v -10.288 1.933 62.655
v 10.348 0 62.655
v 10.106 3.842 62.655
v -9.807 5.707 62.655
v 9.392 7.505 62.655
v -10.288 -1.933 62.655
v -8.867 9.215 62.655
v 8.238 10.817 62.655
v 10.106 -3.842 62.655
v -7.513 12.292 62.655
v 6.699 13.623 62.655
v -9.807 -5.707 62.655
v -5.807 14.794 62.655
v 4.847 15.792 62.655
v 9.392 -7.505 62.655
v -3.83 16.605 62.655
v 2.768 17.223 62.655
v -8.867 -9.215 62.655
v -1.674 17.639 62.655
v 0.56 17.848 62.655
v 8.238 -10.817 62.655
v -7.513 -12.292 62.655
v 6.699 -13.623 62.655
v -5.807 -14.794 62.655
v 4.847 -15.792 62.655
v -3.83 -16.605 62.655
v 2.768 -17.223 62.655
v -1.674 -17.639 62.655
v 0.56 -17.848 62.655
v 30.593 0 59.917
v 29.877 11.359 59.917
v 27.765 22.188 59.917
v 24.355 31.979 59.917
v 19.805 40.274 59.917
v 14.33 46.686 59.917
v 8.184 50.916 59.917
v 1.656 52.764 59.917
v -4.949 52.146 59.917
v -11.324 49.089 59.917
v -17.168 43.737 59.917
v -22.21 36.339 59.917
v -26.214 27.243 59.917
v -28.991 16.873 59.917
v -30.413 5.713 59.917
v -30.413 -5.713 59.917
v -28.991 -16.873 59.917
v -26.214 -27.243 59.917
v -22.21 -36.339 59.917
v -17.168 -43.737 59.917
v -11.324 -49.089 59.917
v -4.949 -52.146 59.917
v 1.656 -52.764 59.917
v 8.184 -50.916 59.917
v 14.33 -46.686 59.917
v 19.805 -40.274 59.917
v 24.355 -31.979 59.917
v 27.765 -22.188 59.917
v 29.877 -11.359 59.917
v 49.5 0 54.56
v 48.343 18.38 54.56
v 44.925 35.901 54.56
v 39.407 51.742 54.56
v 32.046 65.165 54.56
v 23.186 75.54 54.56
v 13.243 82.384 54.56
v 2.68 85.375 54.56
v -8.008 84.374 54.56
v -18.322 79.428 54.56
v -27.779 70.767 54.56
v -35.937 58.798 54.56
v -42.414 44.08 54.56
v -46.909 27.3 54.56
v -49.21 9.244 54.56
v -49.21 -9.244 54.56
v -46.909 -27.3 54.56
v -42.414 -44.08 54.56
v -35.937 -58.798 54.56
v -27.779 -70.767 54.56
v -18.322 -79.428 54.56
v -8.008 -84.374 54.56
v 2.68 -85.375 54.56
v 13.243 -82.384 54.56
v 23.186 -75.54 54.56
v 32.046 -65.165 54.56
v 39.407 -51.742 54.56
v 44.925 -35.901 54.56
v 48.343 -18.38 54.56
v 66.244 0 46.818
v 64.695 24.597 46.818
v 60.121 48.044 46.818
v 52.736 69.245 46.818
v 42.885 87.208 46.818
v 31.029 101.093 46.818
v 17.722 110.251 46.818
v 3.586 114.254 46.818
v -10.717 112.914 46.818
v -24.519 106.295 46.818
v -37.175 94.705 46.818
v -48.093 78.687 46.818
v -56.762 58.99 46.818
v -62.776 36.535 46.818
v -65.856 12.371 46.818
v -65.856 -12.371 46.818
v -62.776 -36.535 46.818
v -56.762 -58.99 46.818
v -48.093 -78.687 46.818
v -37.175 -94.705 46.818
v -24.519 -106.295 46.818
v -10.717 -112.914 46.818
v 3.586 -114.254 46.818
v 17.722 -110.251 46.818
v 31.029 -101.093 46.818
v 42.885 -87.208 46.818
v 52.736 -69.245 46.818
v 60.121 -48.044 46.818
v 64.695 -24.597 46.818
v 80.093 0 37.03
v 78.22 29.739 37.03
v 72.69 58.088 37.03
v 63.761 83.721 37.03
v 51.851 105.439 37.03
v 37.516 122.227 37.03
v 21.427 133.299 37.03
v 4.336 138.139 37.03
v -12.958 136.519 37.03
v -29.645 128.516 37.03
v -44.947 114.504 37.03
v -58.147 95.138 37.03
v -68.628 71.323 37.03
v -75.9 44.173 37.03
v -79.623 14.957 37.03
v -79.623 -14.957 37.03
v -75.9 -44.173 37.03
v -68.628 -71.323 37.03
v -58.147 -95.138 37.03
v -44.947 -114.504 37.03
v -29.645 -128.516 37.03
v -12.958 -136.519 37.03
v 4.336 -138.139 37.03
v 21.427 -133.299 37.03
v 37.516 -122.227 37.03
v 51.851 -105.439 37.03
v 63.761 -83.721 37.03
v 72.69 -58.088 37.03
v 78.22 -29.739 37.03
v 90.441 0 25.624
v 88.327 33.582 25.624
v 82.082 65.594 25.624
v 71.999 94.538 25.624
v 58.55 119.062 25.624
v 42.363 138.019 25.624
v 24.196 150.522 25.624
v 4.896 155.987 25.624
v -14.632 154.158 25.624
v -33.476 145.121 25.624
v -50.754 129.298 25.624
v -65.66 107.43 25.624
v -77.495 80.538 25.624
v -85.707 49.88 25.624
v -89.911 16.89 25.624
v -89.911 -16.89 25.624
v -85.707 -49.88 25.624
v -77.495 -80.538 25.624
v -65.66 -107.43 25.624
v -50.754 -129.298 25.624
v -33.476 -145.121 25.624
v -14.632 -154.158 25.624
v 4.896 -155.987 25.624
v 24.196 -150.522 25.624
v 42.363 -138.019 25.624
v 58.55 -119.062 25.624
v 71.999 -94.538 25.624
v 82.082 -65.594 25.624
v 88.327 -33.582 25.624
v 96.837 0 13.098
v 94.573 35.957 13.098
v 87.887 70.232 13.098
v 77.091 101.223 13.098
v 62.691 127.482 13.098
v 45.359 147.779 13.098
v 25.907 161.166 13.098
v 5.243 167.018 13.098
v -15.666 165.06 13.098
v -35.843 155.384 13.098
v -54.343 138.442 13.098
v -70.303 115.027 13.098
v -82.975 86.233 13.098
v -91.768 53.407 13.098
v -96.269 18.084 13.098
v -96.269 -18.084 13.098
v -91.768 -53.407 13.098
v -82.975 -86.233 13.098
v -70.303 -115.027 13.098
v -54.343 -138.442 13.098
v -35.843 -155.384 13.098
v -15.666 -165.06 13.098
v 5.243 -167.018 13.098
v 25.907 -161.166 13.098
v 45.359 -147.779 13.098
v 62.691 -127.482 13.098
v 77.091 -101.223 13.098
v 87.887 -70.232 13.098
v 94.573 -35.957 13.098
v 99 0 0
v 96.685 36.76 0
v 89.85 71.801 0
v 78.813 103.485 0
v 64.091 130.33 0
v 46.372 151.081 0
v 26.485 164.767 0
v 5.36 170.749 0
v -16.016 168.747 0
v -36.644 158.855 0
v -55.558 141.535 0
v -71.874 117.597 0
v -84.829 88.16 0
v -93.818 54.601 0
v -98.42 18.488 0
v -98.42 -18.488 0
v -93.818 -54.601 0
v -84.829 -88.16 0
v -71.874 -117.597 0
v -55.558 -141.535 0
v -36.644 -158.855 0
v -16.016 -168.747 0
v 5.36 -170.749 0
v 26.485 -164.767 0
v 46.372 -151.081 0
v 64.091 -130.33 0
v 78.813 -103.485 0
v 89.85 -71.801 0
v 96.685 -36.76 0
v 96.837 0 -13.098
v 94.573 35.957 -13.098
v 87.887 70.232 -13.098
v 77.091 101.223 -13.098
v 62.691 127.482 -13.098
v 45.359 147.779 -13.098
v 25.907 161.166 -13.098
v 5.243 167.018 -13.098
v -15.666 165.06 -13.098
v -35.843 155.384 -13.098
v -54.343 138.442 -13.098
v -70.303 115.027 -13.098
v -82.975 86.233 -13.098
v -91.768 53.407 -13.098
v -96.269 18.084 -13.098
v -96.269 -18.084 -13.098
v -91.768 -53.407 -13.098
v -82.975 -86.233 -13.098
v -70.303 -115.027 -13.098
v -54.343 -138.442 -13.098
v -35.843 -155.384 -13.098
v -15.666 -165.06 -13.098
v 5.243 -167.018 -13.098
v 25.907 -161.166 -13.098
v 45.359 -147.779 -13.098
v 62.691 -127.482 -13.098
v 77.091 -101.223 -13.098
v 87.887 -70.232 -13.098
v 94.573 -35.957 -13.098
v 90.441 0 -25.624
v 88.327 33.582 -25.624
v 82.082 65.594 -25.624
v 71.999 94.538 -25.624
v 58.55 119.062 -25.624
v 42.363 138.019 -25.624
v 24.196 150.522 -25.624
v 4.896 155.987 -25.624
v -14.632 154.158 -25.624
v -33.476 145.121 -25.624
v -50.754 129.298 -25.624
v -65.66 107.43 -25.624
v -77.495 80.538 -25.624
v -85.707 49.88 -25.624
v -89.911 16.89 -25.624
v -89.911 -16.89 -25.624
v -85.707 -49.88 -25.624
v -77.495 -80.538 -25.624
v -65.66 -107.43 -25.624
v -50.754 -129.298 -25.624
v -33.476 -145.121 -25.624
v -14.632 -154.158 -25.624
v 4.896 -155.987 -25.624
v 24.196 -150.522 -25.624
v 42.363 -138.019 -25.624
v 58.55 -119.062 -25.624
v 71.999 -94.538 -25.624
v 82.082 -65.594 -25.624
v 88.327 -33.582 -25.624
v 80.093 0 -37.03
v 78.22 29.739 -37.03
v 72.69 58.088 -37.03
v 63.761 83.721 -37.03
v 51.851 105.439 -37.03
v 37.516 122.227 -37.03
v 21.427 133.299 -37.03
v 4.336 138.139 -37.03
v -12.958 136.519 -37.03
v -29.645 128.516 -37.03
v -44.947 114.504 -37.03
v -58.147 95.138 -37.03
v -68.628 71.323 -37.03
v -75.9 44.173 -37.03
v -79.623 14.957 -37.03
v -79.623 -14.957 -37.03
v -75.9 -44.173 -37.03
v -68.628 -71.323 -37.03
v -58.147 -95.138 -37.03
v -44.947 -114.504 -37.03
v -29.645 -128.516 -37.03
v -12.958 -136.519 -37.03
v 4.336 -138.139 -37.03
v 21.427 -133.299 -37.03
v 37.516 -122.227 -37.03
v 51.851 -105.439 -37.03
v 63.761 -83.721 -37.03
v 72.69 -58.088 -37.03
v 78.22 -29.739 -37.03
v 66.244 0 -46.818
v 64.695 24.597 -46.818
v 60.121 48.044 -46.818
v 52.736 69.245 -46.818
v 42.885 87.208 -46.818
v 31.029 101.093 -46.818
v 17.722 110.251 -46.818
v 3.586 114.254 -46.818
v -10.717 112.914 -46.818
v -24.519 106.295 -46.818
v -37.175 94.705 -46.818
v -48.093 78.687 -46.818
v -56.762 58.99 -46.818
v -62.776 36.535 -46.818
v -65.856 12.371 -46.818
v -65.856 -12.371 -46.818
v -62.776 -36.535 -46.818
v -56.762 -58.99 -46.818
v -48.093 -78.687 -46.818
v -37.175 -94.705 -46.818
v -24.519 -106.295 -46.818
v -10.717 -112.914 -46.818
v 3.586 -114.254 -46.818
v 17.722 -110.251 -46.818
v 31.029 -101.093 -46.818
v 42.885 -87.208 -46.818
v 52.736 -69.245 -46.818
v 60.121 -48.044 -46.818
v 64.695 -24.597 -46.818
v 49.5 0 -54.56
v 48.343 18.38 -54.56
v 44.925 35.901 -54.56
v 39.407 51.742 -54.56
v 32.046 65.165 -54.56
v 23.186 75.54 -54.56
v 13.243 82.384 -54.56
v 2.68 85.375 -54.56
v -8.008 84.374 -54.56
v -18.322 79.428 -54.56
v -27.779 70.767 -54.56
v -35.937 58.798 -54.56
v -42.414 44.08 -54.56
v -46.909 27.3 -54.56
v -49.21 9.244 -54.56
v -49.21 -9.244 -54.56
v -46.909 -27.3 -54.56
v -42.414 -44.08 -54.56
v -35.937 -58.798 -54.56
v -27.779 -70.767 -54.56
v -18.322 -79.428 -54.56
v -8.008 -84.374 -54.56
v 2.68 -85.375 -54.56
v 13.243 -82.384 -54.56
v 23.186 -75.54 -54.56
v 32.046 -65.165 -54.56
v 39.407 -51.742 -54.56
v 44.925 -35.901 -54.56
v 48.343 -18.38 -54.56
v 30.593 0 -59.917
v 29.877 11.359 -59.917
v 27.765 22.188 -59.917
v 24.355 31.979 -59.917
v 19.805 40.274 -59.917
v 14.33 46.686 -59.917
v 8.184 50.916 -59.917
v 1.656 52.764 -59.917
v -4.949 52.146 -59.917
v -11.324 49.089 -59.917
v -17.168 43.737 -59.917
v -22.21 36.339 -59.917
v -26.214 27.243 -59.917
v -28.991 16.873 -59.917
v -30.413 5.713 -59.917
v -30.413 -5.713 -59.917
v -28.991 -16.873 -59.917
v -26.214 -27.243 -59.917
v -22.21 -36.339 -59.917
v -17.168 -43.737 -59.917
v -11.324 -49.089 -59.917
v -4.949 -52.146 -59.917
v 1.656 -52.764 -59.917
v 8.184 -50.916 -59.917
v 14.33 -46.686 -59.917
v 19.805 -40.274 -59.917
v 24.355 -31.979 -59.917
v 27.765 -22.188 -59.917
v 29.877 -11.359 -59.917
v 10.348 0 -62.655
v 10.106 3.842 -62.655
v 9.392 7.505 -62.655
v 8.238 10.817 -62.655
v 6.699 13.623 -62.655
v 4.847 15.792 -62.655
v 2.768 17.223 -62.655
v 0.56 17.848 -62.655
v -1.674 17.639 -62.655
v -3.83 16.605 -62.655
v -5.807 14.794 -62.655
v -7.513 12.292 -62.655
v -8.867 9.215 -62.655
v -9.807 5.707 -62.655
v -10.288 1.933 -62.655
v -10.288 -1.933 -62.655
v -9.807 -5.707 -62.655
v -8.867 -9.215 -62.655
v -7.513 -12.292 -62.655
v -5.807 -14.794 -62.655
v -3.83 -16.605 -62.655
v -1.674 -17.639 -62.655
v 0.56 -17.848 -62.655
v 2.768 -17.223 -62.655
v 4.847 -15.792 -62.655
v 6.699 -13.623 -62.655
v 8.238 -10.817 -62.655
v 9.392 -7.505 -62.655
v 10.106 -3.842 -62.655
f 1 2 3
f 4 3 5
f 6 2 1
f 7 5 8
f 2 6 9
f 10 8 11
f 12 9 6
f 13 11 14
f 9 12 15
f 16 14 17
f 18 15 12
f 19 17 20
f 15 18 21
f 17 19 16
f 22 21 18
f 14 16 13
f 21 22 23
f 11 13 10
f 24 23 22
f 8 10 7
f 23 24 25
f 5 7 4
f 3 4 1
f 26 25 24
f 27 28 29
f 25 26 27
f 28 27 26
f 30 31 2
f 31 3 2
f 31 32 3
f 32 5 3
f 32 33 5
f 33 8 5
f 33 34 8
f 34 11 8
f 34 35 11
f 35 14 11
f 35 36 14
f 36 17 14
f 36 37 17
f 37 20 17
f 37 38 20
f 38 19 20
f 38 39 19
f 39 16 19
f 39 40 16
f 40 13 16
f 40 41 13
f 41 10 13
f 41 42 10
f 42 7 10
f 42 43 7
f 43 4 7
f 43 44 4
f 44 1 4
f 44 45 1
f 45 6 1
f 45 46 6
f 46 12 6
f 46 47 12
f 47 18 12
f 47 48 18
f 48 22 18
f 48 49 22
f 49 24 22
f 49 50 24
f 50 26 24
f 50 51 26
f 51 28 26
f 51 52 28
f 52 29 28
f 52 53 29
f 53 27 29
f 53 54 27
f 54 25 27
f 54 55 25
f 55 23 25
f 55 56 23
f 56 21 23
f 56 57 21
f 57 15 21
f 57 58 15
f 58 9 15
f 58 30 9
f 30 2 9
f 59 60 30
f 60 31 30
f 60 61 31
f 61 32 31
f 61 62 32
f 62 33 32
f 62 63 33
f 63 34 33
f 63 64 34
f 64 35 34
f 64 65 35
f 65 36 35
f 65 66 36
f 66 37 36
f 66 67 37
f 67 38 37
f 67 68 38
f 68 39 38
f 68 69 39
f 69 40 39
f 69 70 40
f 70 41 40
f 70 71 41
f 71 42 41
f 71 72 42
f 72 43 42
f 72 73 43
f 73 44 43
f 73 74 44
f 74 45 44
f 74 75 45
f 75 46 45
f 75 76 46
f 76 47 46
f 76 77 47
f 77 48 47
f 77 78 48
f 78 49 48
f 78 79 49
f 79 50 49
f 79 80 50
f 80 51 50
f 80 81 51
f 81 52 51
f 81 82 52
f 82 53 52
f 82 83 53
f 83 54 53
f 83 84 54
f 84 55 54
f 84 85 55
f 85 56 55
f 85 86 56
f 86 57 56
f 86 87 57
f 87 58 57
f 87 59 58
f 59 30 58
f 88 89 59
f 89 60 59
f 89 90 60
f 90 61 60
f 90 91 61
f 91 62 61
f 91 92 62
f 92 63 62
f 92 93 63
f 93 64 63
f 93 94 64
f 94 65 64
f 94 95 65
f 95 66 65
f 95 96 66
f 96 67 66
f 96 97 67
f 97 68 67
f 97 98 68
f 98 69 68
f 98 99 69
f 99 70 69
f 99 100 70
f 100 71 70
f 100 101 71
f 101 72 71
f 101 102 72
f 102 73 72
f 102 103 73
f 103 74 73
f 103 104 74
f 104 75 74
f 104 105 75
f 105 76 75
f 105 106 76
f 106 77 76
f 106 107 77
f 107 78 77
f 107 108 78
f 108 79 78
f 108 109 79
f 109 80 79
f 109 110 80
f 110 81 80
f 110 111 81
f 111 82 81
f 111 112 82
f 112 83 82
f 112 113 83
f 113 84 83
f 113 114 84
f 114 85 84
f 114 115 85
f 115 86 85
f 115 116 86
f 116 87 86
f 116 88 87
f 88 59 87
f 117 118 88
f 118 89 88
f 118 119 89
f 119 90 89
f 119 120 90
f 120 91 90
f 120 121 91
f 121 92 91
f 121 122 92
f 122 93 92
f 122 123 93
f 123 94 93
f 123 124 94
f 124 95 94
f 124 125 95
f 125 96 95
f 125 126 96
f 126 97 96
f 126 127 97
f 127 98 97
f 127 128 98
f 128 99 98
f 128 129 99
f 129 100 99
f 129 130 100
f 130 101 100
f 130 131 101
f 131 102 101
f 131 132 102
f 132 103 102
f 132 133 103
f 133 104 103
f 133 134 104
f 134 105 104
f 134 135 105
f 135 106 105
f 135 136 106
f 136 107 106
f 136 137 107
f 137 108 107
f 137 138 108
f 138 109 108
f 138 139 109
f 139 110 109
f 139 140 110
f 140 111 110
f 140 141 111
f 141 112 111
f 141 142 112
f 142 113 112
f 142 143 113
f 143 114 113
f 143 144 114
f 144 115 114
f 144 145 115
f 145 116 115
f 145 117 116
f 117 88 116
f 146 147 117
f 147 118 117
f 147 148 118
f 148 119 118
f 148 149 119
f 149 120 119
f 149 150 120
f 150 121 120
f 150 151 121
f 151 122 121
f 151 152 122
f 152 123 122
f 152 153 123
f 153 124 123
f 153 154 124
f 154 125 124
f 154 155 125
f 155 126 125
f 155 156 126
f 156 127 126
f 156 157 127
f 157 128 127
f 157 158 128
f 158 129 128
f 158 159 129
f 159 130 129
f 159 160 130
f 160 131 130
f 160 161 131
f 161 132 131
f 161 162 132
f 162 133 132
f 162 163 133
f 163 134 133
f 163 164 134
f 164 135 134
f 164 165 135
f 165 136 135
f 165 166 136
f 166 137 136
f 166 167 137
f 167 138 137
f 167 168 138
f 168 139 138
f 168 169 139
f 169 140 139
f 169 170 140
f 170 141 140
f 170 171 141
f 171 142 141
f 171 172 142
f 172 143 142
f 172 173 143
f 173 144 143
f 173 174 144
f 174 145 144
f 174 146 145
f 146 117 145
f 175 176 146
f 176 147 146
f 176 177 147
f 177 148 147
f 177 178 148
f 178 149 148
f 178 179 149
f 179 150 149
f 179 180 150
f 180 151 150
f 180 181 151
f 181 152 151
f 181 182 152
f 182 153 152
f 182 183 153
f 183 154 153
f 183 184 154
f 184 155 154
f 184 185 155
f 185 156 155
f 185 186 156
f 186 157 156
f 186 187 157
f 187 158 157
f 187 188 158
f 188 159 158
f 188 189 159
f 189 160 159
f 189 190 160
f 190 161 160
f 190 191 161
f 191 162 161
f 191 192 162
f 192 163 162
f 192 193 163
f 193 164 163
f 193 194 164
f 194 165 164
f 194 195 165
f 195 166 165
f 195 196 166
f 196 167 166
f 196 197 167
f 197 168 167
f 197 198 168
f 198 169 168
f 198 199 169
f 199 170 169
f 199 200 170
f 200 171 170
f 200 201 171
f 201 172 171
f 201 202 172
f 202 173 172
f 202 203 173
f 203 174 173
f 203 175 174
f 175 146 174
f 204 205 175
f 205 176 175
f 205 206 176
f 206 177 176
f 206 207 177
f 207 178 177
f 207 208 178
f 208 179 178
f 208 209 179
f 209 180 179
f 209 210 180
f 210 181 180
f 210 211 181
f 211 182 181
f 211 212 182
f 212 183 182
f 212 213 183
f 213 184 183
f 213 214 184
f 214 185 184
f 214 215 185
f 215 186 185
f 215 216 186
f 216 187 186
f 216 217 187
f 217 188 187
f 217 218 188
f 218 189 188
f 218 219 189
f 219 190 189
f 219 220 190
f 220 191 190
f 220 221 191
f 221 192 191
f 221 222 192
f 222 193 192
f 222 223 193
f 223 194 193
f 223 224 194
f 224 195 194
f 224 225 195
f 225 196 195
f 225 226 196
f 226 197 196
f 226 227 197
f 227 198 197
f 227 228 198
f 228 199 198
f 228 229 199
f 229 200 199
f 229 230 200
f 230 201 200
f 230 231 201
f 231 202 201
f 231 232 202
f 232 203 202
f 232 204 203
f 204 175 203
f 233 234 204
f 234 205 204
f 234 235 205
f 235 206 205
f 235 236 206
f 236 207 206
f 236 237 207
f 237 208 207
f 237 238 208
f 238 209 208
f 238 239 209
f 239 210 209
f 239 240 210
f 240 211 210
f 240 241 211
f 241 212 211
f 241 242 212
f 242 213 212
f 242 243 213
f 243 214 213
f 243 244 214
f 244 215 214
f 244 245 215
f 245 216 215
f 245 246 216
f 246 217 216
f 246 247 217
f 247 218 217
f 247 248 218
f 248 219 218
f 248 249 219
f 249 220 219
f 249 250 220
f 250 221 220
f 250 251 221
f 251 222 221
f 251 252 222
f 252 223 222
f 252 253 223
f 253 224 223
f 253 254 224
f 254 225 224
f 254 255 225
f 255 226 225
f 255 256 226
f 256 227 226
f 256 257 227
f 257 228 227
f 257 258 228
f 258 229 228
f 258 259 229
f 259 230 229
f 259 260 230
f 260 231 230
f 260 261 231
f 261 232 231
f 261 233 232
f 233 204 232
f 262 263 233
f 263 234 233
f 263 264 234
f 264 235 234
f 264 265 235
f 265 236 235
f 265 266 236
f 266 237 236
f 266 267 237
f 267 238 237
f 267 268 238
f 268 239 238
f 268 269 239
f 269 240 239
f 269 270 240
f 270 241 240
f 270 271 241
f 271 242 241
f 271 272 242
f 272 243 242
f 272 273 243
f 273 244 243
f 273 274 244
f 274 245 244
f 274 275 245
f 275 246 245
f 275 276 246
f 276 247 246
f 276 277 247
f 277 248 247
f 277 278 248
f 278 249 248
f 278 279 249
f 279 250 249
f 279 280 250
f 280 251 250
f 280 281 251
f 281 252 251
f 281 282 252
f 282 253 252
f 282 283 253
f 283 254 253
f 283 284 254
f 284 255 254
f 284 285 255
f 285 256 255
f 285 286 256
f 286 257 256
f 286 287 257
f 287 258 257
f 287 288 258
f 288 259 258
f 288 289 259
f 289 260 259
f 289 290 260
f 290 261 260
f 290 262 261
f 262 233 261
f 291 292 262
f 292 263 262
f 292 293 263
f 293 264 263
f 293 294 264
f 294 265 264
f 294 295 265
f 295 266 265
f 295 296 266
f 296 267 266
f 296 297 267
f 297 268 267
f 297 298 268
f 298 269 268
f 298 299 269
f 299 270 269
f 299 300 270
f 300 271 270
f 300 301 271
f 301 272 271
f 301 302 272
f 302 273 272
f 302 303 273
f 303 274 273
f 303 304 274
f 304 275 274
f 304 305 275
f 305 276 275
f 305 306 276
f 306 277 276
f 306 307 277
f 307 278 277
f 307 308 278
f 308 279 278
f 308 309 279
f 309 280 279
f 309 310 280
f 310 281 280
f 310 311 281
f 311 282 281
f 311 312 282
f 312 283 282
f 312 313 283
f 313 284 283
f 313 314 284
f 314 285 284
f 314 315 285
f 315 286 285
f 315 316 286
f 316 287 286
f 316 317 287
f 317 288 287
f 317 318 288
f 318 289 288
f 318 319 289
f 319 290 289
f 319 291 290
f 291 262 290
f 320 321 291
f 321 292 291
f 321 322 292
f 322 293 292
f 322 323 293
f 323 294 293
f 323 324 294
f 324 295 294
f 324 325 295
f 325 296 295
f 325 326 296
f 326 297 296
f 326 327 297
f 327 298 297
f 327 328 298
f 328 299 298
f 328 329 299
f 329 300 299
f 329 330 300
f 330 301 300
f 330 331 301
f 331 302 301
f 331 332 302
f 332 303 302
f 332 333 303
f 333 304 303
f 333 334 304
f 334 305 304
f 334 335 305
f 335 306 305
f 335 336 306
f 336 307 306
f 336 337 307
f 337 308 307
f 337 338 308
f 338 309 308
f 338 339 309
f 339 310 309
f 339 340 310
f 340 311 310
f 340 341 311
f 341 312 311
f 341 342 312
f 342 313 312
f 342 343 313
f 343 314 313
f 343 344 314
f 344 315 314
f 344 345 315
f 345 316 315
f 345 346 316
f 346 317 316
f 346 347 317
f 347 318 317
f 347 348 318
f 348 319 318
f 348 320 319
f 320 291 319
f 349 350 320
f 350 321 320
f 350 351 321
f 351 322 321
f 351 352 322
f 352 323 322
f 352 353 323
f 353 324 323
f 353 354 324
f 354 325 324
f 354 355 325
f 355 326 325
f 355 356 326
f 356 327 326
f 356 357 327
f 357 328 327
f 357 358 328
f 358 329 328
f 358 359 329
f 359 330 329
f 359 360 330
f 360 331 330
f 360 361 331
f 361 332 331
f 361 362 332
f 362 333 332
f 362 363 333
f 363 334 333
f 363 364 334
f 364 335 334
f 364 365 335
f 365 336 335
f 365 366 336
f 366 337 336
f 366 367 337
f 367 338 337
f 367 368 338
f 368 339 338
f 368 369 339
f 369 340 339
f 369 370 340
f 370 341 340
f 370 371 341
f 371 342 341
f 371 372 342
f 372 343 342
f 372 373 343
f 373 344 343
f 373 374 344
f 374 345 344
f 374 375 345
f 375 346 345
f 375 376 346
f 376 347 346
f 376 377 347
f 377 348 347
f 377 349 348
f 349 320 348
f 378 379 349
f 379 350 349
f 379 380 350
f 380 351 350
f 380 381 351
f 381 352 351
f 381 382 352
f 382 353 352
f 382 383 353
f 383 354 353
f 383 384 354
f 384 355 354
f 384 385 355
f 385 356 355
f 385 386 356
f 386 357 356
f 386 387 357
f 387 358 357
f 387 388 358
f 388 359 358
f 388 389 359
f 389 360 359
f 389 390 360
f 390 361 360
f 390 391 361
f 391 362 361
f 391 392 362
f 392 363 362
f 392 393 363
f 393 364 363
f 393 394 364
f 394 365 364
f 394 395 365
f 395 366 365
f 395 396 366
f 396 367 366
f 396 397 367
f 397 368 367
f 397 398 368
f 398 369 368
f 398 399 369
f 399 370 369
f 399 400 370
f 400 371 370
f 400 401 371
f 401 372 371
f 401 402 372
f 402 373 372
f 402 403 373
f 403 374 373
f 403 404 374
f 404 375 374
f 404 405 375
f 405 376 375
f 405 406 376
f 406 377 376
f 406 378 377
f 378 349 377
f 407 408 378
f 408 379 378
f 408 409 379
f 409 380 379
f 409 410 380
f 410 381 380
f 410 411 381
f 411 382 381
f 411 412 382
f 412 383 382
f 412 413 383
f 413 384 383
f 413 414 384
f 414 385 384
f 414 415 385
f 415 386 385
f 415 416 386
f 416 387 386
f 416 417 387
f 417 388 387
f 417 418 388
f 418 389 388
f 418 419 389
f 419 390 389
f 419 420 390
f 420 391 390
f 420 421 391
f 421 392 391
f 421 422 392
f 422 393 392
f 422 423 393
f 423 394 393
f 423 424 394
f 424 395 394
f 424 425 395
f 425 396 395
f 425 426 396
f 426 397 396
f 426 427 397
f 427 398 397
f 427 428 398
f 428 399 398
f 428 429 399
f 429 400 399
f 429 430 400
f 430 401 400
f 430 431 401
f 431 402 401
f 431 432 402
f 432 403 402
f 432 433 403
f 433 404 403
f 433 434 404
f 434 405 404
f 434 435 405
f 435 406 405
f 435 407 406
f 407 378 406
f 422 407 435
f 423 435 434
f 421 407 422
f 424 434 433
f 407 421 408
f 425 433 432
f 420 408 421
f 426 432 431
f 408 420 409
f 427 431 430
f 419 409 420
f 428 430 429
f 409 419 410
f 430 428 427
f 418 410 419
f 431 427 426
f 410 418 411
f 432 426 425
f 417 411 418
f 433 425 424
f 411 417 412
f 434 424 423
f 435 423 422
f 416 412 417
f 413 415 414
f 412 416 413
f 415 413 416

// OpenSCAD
// Generated by SolidPython 1.0.1 on 2020-07-29 00:46:50


scale(v = [11, 19, 7]) {
	sphere(r = 9);
}
/***********************************************
*********      SolidPython code:      **********
************************************************
 
# import packages: SolidPython
from solid import *
from solid.utils import *
from itertools import chain, combinations, permutations


class Resize:

    def __init__(self, scad_file):
        self.scad_file = scad_file
        #self.scad_file = import_scad(scad_file)
        # cone/cylinder param:
        self.r1 = 0
        self.r2 = 0
        self.h = 0
        # rectangular prism param:
        self.w = 0
        self.l = 0
        # ellipse param:
        self.r = 0

    # import OpenScad code (file name corresponds to shape)


    # classify shape + parameters
    def assign(self, param1, param2, param3):
        if self.scad_file == 'cone.scad':
            self.r1 = param1
            self.r2 = param2
            self.h = param3
        elif self.scad_file == 'cylinder.scad':
            self.r1 = param1
            self.r2 = param2
            self.h = param3
        elif self.scad_file == 'rectangularPrism.scad':
            self.h = param1
            self.l = param2
            self.w = param3
        else:
            self.r = param1
            self.h = param2

    # resize parameters
    def iterate(self):
        x = range(3, 20, 2)
        i = 1
        if self.scad_file == 'cone.scad':
            tempList = list(permutations(x, 2))
            for temp in tempList:
                param1 = temp[0]
                param2 = temp[1]
                filepath = 'produced_scad_files/' + 'cone' + str(param1) + '_' + str(param2) + '_' + '.scad'
                scad_render_to_file(cylinder(h=param1, r1=param2, r2=0), filepath)

        elif self.scad_file == 'cylinder.scad':
            tempList = list(permutations(x, 3))
            for temp in tempList:
                param1 = temp[0]
                param2 = temp[1]
                filepath = 'produced_scad_files/' + 'cylinder' + str(param1) + '_' + str(param2) + '_' + '.scad'
                scad_render_to_file(cylinder(h=param1, r1=param2, r2=param2), filepath)

        elif self.scad_file == 'rectangularPrism.scad':
            tempList = list(permutations(x, 3))
            for temp in tempList:
                param1 = temp[0]
                param2 = temp[1]
                param3 = temp[2]
                filepath = 'produced_scad_files/' + 'rectangularPrism' + str(param1) + '_' + str(param2) + '_' + str(
                    param3) + '.scad'
                scad_render_to_file(cube(size=(param1, param2, param3)), filepath)

        elif self.scad_file == 'ellipse.scad':
            tempList = list(permutations(x, 4))
            for temp in tempList:
                param1 = temp[0]
                param2 = temp[1]
                param3 = temp[2]
                param4 = temp[3]
                filepath = 'produced_scad_files/' + 'ellipse' + str(param1) + '_' + str(param2) + '_' + str(param3) + '_' + str(param4) + '.scad'
                scad_render_to_file(scale([param1, param2, param3])(sphere(r=param4)), filepath)

    def render_to_scadfile(self):
        scad_render_to_file(scad, 'example.scad') 
 
************************************************/
